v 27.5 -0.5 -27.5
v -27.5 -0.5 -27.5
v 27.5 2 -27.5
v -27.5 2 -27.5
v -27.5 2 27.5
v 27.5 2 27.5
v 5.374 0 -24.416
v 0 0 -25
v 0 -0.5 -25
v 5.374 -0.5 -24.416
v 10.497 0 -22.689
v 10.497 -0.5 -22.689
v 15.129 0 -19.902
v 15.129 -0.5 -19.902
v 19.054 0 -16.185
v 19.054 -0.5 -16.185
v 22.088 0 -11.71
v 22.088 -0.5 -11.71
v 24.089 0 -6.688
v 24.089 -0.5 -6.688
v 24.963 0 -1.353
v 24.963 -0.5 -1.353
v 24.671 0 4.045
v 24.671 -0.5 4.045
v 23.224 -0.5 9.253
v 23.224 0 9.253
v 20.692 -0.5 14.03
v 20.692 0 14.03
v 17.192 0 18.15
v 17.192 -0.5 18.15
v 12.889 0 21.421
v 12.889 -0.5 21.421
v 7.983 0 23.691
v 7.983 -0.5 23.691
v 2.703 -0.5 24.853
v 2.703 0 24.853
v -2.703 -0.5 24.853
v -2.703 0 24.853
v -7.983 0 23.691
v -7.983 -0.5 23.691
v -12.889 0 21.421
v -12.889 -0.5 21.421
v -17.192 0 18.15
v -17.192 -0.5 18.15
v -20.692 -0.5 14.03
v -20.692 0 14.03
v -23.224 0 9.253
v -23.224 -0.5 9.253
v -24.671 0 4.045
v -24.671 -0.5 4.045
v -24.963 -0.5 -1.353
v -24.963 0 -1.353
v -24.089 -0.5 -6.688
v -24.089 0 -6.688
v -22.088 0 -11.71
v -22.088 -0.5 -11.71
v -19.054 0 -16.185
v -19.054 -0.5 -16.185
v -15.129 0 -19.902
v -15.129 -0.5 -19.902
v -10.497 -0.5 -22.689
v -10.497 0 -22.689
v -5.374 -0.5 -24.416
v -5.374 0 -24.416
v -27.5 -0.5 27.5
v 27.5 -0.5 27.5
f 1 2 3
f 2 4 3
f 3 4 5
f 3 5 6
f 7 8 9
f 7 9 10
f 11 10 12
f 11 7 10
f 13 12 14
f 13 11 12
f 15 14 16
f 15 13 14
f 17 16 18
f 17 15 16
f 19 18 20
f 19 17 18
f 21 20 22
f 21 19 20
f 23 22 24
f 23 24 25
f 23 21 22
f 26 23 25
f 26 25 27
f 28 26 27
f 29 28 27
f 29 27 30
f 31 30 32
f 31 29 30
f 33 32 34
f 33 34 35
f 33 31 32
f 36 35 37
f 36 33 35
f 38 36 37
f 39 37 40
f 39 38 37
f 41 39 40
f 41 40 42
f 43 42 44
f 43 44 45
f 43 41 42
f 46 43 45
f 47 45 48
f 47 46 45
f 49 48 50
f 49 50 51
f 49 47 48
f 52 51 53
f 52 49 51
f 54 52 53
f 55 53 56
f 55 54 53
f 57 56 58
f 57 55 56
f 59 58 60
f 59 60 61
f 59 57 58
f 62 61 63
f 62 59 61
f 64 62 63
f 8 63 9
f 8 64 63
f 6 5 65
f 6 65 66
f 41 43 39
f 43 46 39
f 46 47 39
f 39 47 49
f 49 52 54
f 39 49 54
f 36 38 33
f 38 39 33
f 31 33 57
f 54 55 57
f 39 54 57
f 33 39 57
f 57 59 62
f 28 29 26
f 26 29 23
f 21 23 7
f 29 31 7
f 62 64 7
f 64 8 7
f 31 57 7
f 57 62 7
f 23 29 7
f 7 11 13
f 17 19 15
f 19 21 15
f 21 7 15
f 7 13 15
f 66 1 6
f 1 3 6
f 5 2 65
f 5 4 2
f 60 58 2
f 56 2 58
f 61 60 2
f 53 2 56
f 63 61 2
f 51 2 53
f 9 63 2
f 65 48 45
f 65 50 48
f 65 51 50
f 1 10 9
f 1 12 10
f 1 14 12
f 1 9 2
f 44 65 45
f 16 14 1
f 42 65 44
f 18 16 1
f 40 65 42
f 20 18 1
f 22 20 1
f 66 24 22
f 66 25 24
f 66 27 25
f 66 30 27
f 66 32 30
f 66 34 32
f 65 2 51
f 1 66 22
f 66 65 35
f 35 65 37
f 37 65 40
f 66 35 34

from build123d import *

# Parameters (mm, degrees)
ESBO_O1_W                = 55
ESBO_O1_H                = 55
RESSALTO_EXTRUS_O1_DEPTH = 2
ESBO_O3_W                = 55
ESBO_O3_H                = 55
ESBO_O3_R                = 25
RESSALTO_EXTRUS_O3_DEPTH = 0.5


with BuildPart() as part:
    # Esboço1 → Ressalto-extrusão1 (new body)
    with BuildSketch(Plane(origin=(0, 0, 0), x_dir=(1, 0, 0), z_dir=(0, 1, 0))):
        Rectangle(ESBO_O1_W, ESBO_O1_H)
    extrude(amount=RESSALTO_EXTRUS_O1_DEPTH)

    # Esboço3 → Ressalto-extrusão3 (add)
    with BuildSketch(Plane.XZ):
        Rectangle(ESBO_O3_W, ESBO_O3_H)
        with Locations(Location((0, 0, 0), (0, 0, 270))):
            Circle(ESBO_O3_R, mode=Mode.SUBTRACT)
    extrude(amount=RESSALTO_EXTRUS_O3_DEPTH)


solid = part.part
